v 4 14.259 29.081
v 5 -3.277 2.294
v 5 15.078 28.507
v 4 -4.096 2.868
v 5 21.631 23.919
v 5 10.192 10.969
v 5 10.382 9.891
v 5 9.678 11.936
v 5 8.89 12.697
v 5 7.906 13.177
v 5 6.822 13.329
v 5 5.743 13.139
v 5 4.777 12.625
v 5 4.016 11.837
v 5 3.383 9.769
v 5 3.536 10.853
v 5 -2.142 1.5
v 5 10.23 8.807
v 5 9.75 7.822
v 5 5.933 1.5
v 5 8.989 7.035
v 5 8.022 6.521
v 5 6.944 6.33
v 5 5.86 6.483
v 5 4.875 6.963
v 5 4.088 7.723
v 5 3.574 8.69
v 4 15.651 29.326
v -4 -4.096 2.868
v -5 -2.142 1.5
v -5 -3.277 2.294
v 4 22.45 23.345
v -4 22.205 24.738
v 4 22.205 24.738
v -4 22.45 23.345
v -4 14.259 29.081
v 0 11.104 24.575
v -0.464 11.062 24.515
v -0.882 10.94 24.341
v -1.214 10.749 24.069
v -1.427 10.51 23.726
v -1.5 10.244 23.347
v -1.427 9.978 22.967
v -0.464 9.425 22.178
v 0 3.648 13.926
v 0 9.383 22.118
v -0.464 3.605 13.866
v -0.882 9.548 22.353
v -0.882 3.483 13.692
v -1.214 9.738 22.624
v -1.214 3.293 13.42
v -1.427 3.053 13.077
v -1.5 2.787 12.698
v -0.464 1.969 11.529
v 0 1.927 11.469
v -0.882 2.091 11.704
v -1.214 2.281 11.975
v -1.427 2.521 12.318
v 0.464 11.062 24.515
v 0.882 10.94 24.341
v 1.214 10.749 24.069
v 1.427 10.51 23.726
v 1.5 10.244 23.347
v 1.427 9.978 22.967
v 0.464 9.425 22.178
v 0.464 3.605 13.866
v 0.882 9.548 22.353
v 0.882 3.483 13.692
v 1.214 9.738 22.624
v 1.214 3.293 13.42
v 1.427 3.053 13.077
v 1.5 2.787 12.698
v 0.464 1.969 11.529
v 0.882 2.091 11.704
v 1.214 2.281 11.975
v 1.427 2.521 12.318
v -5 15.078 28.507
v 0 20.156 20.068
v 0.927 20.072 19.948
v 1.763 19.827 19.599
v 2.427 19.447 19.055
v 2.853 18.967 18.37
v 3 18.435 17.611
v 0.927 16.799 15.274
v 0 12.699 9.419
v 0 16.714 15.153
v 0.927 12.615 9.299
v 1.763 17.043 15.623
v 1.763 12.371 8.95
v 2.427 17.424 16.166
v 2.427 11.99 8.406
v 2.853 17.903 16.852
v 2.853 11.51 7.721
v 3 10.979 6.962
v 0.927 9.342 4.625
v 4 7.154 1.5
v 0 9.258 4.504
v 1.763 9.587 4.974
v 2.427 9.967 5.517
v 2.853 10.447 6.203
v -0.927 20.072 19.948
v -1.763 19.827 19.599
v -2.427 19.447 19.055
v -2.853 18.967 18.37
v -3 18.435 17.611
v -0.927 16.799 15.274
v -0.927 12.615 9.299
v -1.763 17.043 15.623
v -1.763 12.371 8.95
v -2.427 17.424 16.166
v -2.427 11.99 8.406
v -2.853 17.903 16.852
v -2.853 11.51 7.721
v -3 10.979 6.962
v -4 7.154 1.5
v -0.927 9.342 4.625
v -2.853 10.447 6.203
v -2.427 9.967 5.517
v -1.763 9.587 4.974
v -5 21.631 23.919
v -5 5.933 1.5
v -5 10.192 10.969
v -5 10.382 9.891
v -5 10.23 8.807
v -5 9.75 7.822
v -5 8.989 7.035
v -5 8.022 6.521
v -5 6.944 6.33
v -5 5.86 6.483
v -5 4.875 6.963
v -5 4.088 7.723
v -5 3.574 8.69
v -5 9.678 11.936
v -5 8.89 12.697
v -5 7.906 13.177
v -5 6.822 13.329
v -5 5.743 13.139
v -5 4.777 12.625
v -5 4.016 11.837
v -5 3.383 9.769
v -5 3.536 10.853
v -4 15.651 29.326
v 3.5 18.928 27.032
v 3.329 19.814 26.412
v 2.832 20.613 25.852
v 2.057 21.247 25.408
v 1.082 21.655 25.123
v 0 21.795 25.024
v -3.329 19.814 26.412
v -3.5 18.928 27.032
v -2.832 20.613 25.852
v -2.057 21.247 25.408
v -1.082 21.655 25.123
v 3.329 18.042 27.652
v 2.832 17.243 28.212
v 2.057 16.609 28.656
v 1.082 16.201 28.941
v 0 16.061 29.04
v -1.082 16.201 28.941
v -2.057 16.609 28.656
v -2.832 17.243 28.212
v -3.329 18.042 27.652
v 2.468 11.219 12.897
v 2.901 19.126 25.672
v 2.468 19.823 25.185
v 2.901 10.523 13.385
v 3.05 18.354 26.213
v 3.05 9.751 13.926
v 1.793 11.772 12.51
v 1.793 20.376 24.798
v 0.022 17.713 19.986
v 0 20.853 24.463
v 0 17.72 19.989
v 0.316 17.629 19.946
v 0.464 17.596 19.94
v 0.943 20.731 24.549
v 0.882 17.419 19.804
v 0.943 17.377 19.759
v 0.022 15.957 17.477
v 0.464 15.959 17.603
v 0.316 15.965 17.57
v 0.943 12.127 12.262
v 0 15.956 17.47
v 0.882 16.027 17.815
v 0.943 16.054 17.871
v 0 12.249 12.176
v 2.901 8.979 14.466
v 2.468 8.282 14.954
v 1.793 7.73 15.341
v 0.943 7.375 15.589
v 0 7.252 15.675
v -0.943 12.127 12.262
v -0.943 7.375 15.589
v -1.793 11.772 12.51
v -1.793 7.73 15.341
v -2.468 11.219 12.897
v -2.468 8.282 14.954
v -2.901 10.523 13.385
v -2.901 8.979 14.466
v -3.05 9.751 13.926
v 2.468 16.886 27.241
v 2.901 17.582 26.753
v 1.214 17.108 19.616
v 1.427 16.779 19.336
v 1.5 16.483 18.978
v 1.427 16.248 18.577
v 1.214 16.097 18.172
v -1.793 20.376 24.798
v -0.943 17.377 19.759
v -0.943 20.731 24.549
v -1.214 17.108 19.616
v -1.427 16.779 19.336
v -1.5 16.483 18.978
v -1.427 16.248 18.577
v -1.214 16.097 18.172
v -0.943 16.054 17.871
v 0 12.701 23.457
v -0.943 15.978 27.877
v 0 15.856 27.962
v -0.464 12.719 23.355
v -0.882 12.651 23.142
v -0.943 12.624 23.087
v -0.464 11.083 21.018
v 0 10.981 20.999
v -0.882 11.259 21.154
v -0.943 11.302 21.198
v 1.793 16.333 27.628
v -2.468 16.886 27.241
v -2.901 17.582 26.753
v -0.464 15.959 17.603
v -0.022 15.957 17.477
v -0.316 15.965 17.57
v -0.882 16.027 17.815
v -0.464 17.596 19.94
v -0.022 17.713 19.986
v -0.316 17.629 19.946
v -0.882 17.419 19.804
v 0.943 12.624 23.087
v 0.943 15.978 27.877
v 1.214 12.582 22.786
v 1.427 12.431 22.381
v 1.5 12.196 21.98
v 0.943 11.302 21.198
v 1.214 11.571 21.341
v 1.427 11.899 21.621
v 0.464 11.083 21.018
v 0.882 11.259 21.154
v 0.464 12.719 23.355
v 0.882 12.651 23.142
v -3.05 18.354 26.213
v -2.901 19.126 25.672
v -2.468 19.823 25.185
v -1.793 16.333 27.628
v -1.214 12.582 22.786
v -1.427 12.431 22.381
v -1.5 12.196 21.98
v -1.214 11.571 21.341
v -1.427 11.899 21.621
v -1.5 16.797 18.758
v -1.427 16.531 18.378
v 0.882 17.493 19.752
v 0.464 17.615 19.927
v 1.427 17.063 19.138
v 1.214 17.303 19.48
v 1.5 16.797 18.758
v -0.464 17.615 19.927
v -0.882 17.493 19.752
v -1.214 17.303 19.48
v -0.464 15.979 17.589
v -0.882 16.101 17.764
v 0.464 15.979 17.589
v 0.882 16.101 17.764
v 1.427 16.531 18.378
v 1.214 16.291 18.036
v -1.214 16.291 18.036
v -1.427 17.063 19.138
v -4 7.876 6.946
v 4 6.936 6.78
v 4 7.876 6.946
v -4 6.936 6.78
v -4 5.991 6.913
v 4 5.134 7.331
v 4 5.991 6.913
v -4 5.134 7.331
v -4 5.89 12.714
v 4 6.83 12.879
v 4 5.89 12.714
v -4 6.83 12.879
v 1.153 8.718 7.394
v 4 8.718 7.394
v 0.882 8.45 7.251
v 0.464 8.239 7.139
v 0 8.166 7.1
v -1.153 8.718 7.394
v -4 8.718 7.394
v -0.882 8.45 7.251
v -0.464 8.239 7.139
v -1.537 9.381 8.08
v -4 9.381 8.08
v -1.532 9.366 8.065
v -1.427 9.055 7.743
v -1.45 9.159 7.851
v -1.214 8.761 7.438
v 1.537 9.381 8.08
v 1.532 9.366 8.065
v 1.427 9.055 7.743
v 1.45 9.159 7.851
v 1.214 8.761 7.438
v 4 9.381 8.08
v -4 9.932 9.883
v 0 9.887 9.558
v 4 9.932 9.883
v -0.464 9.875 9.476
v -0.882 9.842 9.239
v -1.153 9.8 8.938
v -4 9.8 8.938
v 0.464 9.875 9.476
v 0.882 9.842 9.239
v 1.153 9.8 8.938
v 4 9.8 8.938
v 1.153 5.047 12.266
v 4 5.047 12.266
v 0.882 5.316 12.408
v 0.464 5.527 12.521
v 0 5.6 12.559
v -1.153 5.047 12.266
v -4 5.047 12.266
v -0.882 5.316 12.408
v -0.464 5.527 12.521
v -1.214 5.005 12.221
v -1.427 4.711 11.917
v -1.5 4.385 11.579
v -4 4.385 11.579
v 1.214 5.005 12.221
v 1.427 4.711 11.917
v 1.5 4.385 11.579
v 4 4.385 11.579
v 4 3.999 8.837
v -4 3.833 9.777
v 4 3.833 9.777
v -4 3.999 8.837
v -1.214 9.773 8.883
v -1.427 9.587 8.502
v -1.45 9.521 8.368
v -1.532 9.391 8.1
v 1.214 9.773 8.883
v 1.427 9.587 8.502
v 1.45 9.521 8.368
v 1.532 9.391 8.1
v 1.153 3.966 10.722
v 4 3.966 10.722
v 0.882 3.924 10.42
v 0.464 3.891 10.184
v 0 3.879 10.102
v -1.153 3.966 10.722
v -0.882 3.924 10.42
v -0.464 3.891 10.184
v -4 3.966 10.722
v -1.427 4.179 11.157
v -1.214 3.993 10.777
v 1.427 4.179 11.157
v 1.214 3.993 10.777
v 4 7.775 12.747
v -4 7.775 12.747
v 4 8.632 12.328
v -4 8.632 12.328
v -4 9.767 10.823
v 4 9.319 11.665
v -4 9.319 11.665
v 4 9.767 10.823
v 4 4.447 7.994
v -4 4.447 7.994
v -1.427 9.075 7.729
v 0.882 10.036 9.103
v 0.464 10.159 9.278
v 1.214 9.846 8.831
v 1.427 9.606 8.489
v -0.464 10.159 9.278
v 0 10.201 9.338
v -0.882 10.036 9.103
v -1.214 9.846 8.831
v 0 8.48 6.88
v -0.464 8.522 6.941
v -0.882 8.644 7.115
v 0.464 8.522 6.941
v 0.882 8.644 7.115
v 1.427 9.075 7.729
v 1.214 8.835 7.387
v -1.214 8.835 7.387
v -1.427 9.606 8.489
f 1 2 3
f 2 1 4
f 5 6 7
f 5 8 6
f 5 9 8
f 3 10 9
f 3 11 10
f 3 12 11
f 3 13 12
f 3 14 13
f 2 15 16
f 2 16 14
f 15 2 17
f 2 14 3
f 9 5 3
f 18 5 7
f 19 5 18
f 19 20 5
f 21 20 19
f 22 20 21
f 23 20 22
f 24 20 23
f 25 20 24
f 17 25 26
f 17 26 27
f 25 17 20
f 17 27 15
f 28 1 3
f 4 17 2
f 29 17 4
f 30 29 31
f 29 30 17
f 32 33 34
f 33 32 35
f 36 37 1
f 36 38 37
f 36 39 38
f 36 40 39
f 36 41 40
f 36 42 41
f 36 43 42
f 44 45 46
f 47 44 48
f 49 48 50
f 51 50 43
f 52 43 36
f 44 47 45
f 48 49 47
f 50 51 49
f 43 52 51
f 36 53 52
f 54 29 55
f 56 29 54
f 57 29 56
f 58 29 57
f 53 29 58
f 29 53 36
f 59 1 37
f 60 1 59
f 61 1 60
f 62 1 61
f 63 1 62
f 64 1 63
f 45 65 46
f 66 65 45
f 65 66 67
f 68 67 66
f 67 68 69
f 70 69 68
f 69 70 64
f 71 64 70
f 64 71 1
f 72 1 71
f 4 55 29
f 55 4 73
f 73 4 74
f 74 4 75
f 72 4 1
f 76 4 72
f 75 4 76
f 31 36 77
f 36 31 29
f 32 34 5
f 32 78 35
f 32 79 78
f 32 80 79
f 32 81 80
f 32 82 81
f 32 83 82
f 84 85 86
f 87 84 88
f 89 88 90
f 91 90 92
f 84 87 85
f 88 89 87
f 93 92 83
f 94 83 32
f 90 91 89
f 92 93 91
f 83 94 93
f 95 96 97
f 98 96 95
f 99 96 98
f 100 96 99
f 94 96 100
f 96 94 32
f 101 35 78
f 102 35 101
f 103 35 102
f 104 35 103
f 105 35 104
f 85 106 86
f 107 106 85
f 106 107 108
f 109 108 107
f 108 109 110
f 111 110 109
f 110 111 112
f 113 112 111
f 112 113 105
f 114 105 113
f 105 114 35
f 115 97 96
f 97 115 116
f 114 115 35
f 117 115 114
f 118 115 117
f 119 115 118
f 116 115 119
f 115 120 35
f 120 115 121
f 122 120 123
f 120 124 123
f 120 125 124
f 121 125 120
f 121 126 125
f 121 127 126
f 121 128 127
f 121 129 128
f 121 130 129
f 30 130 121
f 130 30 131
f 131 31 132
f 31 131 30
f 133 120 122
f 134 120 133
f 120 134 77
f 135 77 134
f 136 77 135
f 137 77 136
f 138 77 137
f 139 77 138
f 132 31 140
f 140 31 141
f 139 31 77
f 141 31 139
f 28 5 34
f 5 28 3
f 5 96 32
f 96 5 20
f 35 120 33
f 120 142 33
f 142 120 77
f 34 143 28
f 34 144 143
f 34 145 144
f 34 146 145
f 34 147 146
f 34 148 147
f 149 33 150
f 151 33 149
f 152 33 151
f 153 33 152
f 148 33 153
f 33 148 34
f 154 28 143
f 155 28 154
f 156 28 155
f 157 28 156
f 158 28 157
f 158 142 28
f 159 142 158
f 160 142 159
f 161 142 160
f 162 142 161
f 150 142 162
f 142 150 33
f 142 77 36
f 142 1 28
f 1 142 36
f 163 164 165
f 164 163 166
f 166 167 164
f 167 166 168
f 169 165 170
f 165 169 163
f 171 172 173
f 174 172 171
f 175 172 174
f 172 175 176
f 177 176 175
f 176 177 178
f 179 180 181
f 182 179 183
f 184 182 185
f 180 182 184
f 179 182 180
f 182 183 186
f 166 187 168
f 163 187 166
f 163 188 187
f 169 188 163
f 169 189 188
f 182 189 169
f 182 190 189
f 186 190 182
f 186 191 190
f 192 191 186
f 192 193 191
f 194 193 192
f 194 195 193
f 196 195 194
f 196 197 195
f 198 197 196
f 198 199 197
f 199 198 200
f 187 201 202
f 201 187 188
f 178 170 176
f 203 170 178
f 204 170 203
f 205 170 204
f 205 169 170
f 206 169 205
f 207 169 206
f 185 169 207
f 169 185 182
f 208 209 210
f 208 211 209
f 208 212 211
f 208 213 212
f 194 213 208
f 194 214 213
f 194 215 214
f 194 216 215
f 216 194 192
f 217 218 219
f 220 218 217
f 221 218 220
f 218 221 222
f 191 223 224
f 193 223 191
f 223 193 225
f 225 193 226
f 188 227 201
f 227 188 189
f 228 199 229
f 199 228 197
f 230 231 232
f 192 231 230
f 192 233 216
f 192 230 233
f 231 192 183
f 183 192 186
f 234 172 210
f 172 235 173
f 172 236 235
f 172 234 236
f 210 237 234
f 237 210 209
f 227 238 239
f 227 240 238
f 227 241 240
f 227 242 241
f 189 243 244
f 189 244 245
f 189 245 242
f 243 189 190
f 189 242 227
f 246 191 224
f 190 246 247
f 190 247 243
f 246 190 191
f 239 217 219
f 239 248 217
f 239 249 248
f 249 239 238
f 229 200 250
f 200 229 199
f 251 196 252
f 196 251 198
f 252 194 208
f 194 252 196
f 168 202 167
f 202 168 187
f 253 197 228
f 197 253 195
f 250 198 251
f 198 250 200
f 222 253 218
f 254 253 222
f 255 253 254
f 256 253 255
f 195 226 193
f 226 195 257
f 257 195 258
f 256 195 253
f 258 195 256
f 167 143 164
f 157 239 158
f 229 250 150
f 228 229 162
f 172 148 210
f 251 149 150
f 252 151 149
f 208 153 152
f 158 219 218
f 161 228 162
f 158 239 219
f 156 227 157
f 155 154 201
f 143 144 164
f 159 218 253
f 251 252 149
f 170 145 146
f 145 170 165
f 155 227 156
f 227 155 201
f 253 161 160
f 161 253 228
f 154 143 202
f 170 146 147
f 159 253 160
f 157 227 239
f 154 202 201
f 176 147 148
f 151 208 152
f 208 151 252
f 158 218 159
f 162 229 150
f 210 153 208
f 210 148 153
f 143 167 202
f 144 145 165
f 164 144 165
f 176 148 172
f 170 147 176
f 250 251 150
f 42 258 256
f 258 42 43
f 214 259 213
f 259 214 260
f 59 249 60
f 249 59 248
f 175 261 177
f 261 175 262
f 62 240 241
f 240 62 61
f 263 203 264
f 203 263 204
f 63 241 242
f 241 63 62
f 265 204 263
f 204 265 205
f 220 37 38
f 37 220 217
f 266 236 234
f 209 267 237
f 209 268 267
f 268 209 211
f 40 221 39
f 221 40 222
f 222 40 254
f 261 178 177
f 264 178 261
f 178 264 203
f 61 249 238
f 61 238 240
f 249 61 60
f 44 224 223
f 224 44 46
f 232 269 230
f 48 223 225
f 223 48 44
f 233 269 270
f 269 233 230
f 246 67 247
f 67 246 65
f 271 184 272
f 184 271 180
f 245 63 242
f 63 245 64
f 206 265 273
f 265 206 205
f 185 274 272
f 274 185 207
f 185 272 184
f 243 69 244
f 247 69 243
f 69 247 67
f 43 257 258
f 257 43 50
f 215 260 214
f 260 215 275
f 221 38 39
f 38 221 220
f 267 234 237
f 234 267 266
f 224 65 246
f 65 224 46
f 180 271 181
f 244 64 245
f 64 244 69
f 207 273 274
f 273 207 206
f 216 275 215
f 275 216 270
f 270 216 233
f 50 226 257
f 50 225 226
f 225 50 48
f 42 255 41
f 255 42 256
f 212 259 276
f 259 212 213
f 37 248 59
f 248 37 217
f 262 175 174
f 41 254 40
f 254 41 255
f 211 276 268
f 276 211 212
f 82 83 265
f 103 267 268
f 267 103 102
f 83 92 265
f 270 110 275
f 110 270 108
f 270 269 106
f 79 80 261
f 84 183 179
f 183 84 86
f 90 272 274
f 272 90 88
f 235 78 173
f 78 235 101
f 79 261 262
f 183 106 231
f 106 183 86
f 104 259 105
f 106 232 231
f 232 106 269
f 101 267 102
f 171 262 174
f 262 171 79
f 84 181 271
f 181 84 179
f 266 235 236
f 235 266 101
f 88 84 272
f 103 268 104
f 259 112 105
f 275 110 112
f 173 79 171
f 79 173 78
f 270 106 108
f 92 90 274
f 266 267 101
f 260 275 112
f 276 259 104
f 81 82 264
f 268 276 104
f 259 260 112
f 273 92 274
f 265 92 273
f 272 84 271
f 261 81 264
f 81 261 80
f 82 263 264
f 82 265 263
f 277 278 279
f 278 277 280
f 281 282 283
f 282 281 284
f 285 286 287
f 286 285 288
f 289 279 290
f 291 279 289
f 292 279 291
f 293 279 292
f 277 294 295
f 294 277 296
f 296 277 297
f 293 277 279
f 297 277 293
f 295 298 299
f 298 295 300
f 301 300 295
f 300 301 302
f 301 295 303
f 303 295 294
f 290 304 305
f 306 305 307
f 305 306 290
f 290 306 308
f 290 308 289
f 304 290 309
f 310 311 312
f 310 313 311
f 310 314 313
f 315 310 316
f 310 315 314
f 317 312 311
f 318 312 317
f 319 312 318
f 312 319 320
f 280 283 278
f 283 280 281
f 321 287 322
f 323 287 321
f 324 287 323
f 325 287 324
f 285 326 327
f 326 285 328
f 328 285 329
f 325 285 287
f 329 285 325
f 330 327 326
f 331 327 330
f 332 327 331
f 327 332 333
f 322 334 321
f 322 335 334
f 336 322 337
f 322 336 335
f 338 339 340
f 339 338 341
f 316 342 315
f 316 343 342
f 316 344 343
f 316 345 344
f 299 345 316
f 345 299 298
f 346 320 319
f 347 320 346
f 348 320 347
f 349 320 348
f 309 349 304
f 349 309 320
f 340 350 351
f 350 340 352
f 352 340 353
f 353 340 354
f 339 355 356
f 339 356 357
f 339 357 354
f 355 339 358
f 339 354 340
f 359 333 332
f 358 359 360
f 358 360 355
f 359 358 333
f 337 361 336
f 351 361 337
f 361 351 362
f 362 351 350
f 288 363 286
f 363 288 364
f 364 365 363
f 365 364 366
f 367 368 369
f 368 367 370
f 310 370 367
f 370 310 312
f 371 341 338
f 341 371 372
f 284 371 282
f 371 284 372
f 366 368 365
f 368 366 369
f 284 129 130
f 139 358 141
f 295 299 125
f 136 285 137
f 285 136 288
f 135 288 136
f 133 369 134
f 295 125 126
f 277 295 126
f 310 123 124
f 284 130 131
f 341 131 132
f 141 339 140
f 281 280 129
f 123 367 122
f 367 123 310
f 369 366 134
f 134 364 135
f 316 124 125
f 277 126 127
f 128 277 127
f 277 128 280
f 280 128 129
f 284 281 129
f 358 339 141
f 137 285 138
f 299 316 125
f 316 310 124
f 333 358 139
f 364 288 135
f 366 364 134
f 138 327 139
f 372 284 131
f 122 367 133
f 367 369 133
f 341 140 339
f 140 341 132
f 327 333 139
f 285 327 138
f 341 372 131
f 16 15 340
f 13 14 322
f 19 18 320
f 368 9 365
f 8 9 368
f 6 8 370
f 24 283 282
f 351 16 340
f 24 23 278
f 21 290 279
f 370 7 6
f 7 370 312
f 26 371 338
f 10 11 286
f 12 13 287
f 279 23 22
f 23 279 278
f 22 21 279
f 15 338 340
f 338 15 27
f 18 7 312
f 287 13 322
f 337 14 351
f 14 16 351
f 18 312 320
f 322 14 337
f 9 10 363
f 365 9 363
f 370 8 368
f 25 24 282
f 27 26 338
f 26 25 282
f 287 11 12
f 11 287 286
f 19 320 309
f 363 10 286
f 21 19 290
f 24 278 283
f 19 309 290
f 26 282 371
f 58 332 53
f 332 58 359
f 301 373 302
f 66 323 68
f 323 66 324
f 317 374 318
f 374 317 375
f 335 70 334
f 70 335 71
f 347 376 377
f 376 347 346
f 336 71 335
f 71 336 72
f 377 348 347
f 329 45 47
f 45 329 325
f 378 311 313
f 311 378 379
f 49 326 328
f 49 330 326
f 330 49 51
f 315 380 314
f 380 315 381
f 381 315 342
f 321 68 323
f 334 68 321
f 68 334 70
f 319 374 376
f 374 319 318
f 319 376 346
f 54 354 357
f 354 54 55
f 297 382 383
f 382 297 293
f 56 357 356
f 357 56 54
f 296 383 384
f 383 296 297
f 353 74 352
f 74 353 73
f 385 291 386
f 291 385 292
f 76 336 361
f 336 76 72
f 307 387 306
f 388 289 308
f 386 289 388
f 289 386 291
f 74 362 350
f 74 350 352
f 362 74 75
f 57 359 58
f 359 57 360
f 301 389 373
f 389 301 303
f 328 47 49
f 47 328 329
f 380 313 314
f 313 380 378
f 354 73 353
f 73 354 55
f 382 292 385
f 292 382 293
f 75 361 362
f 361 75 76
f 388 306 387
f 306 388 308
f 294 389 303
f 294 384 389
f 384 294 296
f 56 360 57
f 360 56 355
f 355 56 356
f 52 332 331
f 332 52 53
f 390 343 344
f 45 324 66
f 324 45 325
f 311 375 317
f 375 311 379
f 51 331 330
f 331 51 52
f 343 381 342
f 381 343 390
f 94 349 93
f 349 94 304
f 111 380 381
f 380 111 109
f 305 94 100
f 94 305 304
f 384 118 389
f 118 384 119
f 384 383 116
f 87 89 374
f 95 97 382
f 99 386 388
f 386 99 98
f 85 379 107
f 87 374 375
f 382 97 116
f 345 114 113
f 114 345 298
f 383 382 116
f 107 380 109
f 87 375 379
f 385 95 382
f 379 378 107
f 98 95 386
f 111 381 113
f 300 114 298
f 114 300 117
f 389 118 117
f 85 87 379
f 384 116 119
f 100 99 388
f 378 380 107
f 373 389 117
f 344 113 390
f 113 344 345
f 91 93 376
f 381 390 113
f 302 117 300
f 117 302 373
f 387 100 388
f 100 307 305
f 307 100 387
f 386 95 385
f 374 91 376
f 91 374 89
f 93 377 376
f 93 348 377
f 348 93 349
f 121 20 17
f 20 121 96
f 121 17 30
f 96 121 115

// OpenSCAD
/**
 * Martin Egli
 * 2020-09-27
 */
res = 20;
 
module holderA() {
         difference() {
         rotate([-(90-55), 0, 0]) {
             difference() {
                 hull() {
                     translate([-5,-4,0])
                     cube([10, 8, 32]);
                     translate([-4,-5,0])
                     cube([8, 10, 32]);
                     translate([-4,-4,32])
                     cube([8, 8, 1]);
                 }
                 // from top
                 // alupipe, 6 mm
                 translate([0,0,32-15])
                 cylinder(d=6.1, h=15, $fn = res);
                 translate([0,0,32])
                 cylinder(d1=6.1, d2= 7, h=1, $fn = res);
                 
                 // M3 screw
                 translate([0,6,25])
                 rotate([90,0,0])
                 cylinder(d=3, h=12,$fn=res);
                 
                 translate([0,5,25])
                 rotate([90,0,0])
                 cylinder(d2=3, d1=6, h=2,$fn=res);
                 
                 // from side
                 // alupipe, 6 mm
                 translate([-6,0,12])
                 rotate([0,90,0])
                 cylinder(d=6.1, h=15, $fn = res);
                 translate([-5,0,12])
                 rotate([0,90,0])
                 cylinder(d2=6.1, d1= 7, h=1, $fn = res);
                 translate([5,0,12])
                 rotate([0,-90,0])
                 cylinder(d2=6.1, d1= 7, h=1, $fn = res);
                 
                 // M3 screw
                 translate([0,6,12])
                 rotate([90,0,0])
                 cylinder(d=3, h=12,$fn=res);
                 
                 translate([0,5,12])
                 rotate([90,0,0])
                 cylinder(d2=3, d1=6, h=2,$fn=res);
             }
         }
         translate([-10, -10, -3.5])
         cube([20, 20, 5]);
    }
}
module holderB() {
}
module holderC() {
     difference() {
         rotate([-(90-74), 0, 0]) {
             difference() {
                 hull() {
                     translate([-5,-4,0])
                     cube([10, 8, 20]);
                     translate([-4,-5,0])
                     cube([8, 10, 20]);
                     translate([-4,-4,20])
                     cube([8, 8, 1]);
                 }
                 // alupipe, 6 mm
                 translate([0,0,20-15])
                 cylinder(d=6.1, h=15, $fn = res);
                 translate([0,0,20])
                 cylinder(d1=6.1, d2= 7, h=1, $fn = res);
                 
                 // M3 screw
                 translate([0,6,12])
                 rotate([90,0,0])
                 cylinder(d=3, h=12,$fn=res);
                 
                 translate([0,5,12])
                 rotate([90,0,0])
                 cylinder(d2=3, d1=6, h=2,$fn=res);
             }
         }
         translate([-10, -10, -1.5])
         cube([20, 20, 3]);
    }
}


holderA();
//holderB();
//holderC();
 
 
